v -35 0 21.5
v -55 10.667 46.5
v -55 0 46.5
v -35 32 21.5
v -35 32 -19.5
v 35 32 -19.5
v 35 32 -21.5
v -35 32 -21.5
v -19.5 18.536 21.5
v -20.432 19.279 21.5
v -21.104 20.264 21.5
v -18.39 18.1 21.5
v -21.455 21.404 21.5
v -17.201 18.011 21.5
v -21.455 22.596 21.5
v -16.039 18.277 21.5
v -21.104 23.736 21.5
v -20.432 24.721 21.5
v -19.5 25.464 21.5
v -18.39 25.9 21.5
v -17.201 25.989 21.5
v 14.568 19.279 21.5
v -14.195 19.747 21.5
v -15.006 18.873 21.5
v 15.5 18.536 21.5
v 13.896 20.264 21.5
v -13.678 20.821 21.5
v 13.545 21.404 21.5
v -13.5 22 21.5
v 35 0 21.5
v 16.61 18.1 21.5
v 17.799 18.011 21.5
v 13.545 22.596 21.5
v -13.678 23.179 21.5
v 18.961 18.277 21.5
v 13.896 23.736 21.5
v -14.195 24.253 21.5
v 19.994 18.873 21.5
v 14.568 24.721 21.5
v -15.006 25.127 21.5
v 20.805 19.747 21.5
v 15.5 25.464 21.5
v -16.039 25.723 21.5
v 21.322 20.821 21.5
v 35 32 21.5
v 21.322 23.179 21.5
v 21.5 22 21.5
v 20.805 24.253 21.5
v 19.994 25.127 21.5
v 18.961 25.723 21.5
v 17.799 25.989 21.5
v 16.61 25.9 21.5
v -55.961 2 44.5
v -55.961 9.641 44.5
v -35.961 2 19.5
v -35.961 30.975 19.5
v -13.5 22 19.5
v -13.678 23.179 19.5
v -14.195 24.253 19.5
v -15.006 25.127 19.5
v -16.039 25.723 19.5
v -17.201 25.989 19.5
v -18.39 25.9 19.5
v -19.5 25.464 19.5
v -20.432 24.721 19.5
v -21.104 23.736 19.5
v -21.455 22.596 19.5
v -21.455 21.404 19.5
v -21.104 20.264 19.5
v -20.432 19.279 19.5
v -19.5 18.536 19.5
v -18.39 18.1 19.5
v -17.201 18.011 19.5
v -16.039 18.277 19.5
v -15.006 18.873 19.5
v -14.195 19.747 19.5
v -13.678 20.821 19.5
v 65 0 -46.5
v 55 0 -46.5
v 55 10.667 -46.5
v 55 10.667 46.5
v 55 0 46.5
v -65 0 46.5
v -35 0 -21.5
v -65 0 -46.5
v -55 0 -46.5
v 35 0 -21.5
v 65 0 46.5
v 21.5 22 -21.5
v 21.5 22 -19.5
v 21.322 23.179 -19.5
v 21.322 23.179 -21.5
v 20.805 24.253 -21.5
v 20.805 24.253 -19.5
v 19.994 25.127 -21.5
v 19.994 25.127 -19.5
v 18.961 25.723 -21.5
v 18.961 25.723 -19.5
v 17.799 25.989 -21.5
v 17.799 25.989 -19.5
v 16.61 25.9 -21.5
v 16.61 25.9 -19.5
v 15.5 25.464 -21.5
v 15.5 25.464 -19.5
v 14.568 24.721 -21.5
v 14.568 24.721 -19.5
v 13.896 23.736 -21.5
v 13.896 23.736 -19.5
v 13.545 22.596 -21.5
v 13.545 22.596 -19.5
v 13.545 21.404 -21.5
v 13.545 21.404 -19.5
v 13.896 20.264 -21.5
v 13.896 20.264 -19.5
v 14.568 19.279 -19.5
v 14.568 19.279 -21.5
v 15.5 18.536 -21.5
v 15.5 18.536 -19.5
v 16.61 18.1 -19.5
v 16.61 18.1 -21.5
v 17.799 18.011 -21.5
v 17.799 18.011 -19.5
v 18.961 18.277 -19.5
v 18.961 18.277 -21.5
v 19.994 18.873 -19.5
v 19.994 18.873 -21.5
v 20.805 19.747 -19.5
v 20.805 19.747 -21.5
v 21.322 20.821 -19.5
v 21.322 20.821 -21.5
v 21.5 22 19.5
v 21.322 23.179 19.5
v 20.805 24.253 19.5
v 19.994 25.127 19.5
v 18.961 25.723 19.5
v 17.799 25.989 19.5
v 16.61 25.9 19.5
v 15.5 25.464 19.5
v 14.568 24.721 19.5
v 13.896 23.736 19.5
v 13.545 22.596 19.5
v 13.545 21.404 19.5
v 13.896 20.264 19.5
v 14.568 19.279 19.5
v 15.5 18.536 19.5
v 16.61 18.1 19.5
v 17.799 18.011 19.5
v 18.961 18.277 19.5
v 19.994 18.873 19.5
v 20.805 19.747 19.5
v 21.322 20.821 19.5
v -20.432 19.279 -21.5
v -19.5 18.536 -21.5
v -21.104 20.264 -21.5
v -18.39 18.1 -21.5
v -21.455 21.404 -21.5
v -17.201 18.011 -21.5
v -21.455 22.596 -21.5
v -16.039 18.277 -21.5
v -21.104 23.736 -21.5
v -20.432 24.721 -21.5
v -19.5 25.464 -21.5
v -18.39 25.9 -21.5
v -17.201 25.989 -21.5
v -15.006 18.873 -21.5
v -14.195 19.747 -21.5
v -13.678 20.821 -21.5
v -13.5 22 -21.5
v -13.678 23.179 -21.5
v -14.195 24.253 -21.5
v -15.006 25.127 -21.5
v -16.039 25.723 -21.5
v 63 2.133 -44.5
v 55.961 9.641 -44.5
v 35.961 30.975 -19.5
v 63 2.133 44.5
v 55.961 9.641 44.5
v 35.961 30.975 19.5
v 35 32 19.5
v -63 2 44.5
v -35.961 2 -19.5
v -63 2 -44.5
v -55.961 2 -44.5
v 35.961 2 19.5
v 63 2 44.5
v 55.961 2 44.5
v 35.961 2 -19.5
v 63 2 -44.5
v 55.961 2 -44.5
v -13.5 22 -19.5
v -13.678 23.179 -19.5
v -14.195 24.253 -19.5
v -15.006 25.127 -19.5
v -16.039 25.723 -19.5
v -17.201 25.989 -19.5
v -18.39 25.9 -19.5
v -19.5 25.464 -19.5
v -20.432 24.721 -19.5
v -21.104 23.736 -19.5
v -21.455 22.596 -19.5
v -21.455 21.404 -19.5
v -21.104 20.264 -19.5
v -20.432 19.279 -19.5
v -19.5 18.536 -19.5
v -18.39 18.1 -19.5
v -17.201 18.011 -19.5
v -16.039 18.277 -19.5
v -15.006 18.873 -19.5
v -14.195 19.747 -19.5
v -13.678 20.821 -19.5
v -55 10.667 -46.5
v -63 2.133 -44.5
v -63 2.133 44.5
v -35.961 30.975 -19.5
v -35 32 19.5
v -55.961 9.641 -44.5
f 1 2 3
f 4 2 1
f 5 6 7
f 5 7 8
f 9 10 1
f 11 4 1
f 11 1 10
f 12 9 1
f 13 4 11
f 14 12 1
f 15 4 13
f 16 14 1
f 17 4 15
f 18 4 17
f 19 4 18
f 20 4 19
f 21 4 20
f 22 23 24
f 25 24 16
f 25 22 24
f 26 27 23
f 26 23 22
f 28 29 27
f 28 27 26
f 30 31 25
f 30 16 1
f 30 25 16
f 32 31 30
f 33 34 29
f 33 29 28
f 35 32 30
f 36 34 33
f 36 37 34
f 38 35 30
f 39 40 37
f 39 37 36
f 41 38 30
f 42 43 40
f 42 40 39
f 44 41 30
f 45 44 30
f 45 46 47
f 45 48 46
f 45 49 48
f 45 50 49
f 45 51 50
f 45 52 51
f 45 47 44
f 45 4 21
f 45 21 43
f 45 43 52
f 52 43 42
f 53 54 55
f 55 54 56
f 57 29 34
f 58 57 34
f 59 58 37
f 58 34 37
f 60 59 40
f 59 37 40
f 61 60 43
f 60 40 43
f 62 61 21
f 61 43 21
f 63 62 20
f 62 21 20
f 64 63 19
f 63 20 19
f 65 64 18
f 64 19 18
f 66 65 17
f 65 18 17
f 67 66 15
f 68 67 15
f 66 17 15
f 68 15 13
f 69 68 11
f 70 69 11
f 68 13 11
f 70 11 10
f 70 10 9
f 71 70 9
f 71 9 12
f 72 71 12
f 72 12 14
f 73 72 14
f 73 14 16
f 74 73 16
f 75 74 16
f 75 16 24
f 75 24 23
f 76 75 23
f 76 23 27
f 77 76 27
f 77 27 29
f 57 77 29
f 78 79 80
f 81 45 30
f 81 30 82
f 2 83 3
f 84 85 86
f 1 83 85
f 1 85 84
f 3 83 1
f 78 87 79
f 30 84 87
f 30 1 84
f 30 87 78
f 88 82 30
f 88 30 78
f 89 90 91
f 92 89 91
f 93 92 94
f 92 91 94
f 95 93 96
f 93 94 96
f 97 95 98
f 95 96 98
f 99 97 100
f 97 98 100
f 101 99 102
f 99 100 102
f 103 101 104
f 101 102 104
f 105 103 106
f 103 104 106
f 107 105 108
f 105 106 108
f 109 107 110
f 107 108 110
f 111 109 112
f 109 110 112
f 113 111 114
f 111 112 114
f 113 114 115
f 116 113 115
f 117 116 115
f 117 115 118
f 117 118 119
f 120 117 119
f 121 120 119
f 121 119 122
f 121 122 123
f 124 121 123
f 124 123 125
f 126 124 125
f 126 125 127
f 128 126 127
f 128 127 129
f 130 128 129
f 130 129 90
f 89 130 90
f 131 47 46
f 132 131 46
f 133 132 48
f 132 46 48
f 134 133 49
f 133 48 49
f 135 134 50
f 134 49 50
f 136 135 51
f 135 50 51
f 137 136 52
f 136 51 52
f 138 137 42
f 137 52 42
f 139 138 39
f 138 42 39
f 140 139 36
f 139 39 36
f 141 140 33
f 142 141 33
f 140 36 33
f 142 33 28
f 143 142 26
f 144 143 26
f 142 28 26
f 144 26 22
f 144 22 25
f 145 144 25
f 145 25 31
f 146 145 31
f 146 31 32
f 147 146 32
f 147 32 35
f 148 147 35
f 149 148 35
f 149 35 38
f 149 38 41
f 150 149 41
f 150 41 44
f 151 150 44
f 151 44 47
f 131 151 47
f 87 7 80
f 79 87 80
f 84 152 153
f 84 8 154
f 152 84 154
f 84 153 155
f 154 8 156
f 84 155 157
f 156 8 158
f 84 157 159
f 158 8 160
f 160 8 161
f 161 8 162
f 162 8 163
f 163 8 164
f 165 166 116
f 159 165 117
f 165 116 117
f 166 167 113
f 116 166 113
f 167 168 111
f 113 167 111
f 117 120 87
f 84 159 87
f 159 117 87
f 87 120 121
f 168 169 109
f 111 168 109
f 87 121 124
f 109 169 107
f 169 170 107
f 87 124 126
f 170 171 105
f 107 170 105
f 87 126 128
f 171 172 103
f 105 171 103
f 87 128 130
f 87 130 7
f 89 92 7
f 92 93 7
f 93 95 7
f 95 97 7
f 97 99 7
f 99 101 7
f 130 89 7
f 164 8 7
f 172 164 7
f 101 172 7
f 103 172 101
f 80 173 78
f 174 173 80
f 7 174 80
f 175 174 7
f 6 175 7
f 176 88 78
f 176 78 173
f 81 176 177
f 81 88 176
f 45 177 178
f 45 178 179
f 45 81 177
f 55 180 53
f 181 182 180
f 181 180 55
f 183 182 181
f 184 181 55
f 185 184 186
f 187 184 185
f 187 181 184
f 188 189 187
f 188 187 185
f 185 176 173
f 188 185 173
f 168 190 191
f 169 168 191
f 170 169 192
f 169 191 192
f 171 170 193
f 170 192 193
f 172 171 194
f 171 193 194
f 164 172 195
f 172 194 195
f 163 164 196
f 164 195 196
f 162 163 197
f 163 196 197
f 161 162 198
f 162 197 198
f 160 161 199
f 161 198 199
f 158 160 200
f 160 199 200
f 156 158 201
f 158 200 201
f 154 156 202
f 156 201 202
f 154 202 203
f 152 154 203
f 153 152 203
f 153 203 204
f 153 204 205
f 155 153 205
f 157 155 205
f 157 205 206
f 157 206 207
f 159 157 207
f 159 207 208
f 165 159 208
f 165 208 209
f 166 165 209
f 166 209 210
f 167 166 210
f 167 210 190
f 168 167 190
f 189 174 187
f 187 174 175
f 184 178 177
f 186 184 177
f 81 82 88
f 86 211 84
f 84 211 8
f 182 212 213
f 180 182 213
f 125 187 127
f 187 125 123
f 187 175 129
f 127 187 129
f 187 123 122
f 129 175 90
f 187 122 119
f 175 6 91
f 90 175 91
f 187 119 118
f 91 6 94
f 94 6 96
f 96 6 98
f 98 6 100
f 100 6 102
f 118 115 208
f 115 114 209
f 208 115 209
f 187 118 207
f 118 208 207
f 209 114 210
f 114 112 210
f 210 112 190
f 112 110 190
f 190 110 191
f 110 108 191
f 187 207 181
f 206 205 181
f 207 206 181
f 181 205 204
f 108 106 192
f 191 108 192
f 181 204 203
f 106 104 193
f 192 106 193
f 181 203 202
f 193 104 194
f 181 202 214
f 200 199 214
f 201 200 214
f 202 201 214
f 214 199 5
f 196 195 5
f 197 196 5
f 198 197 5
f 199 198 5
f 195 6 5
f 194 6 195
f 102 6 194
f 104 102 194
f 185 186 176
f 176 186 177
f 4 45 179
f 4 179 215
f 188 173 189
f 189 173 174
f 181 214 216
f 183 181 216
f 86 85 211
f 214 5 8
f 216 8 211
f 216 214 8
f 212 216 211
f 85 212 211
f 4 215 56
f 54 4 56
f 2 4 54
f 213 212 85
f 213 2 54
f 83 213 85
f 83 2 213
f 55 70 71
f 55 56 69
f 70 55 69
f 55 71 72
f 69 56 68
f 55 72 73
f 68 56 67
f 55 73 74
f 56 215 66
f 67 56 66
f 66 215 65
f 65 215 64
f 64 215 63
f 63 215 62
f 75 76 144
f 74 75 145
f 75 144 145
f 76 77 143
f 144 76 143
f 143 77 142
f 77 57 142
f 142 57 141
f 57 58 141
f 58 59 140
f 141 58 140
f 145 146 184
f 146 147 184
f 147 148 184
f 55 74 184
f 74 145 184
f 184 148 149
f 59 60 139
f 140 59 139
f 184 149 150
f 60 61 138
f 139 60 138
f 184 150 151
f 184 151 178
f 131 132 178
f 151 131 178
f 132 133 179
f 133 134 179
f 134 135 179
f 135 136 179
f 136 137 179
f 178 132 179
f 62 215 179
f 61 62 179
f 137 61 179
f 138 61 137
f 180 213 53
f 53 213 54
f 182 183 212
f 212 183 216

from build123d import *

# Parameters (mm, degrees)
EXTRUDE_1_DEPTH     = 46.5
CUT_EXTRUDE_1_DEPTH = 87.088617134
CUT_EXTRUDE_2_DEPTH = 30
SKETCH_4_R          = 4
CUT_EXTRUDE_3_DEPTH = 100.36297097


with BuildPart() as part:
    # ｽｹｯﾁ1 → ﾎﾞｽ - 押し出し1 (new, symmetric)
    with BuildSketch(Plane.XY):
        Polygon((-65, 0), (65, 0), (35, 32), (-35, 32), align=None)
    extrude(amount=EXTRUDE_1_DEPTH, both=True)

    # ｽｹｯﾁ2 → ｶｯﾄ - 押し出し1 (cut, through all)
    with BuildSketch(Plane(origin=(0, 32, 0), x_dir=(1, 0, 0), z_dir=(0, 1, 0))):
        Polygon((-55, -46.5), (-35, -21.5), (35, -21.5), (55, -46.5), align=None)
        Polygon((-55, 46.5), (-35, 21.5), (35, 21.5), (55, 46.5), align=None)
    extrude(amount=-CUT_EXTRUDE_1_DEPTH, mode=Mode.SUBTRACT)

    # ｽｹｯﾁ3 → ｶｯﾄ - 押し出し2 (cut)
    with BuildSketch(Plane(origin=(0, 32, 0), x_dir=(1, 0, 0), z_dir=(0, 1, 0))):
        Polygon((-35.961249695, -19.5), (35.961249695, -19.5), (55.961249695, -44.5), (63, -44.5), (63, 44.5), (55.961249695, 44.5), (35.961249695, 19.5), (-35.961249695, 19.5), (-55.961249695, 44.5), (-63, 44.5), (-63, -44.5), (-55.961249695, -44.5), align=None)
    extrude(amount=-CUT_EXTRUDE_2_DEPTH, mode=Mode.SUBTRACT)

    # ｽｹｯﾁ4 → ｶｯﾄ - 押し出し3 (cut, through all)
    with BuildSketch(Plane.XY.offset(21.5)):
        with Locations((-17.5, 22)):
            Circle(SKETCH_4_R)
        with Locations((17.5, 22)):
            Circle(SKETCH_4_R)
    extrude(amount=-CUT_EXTRUDE_3_DEPTH, mode=Mode.SUBTRACT)


solid = part.part
